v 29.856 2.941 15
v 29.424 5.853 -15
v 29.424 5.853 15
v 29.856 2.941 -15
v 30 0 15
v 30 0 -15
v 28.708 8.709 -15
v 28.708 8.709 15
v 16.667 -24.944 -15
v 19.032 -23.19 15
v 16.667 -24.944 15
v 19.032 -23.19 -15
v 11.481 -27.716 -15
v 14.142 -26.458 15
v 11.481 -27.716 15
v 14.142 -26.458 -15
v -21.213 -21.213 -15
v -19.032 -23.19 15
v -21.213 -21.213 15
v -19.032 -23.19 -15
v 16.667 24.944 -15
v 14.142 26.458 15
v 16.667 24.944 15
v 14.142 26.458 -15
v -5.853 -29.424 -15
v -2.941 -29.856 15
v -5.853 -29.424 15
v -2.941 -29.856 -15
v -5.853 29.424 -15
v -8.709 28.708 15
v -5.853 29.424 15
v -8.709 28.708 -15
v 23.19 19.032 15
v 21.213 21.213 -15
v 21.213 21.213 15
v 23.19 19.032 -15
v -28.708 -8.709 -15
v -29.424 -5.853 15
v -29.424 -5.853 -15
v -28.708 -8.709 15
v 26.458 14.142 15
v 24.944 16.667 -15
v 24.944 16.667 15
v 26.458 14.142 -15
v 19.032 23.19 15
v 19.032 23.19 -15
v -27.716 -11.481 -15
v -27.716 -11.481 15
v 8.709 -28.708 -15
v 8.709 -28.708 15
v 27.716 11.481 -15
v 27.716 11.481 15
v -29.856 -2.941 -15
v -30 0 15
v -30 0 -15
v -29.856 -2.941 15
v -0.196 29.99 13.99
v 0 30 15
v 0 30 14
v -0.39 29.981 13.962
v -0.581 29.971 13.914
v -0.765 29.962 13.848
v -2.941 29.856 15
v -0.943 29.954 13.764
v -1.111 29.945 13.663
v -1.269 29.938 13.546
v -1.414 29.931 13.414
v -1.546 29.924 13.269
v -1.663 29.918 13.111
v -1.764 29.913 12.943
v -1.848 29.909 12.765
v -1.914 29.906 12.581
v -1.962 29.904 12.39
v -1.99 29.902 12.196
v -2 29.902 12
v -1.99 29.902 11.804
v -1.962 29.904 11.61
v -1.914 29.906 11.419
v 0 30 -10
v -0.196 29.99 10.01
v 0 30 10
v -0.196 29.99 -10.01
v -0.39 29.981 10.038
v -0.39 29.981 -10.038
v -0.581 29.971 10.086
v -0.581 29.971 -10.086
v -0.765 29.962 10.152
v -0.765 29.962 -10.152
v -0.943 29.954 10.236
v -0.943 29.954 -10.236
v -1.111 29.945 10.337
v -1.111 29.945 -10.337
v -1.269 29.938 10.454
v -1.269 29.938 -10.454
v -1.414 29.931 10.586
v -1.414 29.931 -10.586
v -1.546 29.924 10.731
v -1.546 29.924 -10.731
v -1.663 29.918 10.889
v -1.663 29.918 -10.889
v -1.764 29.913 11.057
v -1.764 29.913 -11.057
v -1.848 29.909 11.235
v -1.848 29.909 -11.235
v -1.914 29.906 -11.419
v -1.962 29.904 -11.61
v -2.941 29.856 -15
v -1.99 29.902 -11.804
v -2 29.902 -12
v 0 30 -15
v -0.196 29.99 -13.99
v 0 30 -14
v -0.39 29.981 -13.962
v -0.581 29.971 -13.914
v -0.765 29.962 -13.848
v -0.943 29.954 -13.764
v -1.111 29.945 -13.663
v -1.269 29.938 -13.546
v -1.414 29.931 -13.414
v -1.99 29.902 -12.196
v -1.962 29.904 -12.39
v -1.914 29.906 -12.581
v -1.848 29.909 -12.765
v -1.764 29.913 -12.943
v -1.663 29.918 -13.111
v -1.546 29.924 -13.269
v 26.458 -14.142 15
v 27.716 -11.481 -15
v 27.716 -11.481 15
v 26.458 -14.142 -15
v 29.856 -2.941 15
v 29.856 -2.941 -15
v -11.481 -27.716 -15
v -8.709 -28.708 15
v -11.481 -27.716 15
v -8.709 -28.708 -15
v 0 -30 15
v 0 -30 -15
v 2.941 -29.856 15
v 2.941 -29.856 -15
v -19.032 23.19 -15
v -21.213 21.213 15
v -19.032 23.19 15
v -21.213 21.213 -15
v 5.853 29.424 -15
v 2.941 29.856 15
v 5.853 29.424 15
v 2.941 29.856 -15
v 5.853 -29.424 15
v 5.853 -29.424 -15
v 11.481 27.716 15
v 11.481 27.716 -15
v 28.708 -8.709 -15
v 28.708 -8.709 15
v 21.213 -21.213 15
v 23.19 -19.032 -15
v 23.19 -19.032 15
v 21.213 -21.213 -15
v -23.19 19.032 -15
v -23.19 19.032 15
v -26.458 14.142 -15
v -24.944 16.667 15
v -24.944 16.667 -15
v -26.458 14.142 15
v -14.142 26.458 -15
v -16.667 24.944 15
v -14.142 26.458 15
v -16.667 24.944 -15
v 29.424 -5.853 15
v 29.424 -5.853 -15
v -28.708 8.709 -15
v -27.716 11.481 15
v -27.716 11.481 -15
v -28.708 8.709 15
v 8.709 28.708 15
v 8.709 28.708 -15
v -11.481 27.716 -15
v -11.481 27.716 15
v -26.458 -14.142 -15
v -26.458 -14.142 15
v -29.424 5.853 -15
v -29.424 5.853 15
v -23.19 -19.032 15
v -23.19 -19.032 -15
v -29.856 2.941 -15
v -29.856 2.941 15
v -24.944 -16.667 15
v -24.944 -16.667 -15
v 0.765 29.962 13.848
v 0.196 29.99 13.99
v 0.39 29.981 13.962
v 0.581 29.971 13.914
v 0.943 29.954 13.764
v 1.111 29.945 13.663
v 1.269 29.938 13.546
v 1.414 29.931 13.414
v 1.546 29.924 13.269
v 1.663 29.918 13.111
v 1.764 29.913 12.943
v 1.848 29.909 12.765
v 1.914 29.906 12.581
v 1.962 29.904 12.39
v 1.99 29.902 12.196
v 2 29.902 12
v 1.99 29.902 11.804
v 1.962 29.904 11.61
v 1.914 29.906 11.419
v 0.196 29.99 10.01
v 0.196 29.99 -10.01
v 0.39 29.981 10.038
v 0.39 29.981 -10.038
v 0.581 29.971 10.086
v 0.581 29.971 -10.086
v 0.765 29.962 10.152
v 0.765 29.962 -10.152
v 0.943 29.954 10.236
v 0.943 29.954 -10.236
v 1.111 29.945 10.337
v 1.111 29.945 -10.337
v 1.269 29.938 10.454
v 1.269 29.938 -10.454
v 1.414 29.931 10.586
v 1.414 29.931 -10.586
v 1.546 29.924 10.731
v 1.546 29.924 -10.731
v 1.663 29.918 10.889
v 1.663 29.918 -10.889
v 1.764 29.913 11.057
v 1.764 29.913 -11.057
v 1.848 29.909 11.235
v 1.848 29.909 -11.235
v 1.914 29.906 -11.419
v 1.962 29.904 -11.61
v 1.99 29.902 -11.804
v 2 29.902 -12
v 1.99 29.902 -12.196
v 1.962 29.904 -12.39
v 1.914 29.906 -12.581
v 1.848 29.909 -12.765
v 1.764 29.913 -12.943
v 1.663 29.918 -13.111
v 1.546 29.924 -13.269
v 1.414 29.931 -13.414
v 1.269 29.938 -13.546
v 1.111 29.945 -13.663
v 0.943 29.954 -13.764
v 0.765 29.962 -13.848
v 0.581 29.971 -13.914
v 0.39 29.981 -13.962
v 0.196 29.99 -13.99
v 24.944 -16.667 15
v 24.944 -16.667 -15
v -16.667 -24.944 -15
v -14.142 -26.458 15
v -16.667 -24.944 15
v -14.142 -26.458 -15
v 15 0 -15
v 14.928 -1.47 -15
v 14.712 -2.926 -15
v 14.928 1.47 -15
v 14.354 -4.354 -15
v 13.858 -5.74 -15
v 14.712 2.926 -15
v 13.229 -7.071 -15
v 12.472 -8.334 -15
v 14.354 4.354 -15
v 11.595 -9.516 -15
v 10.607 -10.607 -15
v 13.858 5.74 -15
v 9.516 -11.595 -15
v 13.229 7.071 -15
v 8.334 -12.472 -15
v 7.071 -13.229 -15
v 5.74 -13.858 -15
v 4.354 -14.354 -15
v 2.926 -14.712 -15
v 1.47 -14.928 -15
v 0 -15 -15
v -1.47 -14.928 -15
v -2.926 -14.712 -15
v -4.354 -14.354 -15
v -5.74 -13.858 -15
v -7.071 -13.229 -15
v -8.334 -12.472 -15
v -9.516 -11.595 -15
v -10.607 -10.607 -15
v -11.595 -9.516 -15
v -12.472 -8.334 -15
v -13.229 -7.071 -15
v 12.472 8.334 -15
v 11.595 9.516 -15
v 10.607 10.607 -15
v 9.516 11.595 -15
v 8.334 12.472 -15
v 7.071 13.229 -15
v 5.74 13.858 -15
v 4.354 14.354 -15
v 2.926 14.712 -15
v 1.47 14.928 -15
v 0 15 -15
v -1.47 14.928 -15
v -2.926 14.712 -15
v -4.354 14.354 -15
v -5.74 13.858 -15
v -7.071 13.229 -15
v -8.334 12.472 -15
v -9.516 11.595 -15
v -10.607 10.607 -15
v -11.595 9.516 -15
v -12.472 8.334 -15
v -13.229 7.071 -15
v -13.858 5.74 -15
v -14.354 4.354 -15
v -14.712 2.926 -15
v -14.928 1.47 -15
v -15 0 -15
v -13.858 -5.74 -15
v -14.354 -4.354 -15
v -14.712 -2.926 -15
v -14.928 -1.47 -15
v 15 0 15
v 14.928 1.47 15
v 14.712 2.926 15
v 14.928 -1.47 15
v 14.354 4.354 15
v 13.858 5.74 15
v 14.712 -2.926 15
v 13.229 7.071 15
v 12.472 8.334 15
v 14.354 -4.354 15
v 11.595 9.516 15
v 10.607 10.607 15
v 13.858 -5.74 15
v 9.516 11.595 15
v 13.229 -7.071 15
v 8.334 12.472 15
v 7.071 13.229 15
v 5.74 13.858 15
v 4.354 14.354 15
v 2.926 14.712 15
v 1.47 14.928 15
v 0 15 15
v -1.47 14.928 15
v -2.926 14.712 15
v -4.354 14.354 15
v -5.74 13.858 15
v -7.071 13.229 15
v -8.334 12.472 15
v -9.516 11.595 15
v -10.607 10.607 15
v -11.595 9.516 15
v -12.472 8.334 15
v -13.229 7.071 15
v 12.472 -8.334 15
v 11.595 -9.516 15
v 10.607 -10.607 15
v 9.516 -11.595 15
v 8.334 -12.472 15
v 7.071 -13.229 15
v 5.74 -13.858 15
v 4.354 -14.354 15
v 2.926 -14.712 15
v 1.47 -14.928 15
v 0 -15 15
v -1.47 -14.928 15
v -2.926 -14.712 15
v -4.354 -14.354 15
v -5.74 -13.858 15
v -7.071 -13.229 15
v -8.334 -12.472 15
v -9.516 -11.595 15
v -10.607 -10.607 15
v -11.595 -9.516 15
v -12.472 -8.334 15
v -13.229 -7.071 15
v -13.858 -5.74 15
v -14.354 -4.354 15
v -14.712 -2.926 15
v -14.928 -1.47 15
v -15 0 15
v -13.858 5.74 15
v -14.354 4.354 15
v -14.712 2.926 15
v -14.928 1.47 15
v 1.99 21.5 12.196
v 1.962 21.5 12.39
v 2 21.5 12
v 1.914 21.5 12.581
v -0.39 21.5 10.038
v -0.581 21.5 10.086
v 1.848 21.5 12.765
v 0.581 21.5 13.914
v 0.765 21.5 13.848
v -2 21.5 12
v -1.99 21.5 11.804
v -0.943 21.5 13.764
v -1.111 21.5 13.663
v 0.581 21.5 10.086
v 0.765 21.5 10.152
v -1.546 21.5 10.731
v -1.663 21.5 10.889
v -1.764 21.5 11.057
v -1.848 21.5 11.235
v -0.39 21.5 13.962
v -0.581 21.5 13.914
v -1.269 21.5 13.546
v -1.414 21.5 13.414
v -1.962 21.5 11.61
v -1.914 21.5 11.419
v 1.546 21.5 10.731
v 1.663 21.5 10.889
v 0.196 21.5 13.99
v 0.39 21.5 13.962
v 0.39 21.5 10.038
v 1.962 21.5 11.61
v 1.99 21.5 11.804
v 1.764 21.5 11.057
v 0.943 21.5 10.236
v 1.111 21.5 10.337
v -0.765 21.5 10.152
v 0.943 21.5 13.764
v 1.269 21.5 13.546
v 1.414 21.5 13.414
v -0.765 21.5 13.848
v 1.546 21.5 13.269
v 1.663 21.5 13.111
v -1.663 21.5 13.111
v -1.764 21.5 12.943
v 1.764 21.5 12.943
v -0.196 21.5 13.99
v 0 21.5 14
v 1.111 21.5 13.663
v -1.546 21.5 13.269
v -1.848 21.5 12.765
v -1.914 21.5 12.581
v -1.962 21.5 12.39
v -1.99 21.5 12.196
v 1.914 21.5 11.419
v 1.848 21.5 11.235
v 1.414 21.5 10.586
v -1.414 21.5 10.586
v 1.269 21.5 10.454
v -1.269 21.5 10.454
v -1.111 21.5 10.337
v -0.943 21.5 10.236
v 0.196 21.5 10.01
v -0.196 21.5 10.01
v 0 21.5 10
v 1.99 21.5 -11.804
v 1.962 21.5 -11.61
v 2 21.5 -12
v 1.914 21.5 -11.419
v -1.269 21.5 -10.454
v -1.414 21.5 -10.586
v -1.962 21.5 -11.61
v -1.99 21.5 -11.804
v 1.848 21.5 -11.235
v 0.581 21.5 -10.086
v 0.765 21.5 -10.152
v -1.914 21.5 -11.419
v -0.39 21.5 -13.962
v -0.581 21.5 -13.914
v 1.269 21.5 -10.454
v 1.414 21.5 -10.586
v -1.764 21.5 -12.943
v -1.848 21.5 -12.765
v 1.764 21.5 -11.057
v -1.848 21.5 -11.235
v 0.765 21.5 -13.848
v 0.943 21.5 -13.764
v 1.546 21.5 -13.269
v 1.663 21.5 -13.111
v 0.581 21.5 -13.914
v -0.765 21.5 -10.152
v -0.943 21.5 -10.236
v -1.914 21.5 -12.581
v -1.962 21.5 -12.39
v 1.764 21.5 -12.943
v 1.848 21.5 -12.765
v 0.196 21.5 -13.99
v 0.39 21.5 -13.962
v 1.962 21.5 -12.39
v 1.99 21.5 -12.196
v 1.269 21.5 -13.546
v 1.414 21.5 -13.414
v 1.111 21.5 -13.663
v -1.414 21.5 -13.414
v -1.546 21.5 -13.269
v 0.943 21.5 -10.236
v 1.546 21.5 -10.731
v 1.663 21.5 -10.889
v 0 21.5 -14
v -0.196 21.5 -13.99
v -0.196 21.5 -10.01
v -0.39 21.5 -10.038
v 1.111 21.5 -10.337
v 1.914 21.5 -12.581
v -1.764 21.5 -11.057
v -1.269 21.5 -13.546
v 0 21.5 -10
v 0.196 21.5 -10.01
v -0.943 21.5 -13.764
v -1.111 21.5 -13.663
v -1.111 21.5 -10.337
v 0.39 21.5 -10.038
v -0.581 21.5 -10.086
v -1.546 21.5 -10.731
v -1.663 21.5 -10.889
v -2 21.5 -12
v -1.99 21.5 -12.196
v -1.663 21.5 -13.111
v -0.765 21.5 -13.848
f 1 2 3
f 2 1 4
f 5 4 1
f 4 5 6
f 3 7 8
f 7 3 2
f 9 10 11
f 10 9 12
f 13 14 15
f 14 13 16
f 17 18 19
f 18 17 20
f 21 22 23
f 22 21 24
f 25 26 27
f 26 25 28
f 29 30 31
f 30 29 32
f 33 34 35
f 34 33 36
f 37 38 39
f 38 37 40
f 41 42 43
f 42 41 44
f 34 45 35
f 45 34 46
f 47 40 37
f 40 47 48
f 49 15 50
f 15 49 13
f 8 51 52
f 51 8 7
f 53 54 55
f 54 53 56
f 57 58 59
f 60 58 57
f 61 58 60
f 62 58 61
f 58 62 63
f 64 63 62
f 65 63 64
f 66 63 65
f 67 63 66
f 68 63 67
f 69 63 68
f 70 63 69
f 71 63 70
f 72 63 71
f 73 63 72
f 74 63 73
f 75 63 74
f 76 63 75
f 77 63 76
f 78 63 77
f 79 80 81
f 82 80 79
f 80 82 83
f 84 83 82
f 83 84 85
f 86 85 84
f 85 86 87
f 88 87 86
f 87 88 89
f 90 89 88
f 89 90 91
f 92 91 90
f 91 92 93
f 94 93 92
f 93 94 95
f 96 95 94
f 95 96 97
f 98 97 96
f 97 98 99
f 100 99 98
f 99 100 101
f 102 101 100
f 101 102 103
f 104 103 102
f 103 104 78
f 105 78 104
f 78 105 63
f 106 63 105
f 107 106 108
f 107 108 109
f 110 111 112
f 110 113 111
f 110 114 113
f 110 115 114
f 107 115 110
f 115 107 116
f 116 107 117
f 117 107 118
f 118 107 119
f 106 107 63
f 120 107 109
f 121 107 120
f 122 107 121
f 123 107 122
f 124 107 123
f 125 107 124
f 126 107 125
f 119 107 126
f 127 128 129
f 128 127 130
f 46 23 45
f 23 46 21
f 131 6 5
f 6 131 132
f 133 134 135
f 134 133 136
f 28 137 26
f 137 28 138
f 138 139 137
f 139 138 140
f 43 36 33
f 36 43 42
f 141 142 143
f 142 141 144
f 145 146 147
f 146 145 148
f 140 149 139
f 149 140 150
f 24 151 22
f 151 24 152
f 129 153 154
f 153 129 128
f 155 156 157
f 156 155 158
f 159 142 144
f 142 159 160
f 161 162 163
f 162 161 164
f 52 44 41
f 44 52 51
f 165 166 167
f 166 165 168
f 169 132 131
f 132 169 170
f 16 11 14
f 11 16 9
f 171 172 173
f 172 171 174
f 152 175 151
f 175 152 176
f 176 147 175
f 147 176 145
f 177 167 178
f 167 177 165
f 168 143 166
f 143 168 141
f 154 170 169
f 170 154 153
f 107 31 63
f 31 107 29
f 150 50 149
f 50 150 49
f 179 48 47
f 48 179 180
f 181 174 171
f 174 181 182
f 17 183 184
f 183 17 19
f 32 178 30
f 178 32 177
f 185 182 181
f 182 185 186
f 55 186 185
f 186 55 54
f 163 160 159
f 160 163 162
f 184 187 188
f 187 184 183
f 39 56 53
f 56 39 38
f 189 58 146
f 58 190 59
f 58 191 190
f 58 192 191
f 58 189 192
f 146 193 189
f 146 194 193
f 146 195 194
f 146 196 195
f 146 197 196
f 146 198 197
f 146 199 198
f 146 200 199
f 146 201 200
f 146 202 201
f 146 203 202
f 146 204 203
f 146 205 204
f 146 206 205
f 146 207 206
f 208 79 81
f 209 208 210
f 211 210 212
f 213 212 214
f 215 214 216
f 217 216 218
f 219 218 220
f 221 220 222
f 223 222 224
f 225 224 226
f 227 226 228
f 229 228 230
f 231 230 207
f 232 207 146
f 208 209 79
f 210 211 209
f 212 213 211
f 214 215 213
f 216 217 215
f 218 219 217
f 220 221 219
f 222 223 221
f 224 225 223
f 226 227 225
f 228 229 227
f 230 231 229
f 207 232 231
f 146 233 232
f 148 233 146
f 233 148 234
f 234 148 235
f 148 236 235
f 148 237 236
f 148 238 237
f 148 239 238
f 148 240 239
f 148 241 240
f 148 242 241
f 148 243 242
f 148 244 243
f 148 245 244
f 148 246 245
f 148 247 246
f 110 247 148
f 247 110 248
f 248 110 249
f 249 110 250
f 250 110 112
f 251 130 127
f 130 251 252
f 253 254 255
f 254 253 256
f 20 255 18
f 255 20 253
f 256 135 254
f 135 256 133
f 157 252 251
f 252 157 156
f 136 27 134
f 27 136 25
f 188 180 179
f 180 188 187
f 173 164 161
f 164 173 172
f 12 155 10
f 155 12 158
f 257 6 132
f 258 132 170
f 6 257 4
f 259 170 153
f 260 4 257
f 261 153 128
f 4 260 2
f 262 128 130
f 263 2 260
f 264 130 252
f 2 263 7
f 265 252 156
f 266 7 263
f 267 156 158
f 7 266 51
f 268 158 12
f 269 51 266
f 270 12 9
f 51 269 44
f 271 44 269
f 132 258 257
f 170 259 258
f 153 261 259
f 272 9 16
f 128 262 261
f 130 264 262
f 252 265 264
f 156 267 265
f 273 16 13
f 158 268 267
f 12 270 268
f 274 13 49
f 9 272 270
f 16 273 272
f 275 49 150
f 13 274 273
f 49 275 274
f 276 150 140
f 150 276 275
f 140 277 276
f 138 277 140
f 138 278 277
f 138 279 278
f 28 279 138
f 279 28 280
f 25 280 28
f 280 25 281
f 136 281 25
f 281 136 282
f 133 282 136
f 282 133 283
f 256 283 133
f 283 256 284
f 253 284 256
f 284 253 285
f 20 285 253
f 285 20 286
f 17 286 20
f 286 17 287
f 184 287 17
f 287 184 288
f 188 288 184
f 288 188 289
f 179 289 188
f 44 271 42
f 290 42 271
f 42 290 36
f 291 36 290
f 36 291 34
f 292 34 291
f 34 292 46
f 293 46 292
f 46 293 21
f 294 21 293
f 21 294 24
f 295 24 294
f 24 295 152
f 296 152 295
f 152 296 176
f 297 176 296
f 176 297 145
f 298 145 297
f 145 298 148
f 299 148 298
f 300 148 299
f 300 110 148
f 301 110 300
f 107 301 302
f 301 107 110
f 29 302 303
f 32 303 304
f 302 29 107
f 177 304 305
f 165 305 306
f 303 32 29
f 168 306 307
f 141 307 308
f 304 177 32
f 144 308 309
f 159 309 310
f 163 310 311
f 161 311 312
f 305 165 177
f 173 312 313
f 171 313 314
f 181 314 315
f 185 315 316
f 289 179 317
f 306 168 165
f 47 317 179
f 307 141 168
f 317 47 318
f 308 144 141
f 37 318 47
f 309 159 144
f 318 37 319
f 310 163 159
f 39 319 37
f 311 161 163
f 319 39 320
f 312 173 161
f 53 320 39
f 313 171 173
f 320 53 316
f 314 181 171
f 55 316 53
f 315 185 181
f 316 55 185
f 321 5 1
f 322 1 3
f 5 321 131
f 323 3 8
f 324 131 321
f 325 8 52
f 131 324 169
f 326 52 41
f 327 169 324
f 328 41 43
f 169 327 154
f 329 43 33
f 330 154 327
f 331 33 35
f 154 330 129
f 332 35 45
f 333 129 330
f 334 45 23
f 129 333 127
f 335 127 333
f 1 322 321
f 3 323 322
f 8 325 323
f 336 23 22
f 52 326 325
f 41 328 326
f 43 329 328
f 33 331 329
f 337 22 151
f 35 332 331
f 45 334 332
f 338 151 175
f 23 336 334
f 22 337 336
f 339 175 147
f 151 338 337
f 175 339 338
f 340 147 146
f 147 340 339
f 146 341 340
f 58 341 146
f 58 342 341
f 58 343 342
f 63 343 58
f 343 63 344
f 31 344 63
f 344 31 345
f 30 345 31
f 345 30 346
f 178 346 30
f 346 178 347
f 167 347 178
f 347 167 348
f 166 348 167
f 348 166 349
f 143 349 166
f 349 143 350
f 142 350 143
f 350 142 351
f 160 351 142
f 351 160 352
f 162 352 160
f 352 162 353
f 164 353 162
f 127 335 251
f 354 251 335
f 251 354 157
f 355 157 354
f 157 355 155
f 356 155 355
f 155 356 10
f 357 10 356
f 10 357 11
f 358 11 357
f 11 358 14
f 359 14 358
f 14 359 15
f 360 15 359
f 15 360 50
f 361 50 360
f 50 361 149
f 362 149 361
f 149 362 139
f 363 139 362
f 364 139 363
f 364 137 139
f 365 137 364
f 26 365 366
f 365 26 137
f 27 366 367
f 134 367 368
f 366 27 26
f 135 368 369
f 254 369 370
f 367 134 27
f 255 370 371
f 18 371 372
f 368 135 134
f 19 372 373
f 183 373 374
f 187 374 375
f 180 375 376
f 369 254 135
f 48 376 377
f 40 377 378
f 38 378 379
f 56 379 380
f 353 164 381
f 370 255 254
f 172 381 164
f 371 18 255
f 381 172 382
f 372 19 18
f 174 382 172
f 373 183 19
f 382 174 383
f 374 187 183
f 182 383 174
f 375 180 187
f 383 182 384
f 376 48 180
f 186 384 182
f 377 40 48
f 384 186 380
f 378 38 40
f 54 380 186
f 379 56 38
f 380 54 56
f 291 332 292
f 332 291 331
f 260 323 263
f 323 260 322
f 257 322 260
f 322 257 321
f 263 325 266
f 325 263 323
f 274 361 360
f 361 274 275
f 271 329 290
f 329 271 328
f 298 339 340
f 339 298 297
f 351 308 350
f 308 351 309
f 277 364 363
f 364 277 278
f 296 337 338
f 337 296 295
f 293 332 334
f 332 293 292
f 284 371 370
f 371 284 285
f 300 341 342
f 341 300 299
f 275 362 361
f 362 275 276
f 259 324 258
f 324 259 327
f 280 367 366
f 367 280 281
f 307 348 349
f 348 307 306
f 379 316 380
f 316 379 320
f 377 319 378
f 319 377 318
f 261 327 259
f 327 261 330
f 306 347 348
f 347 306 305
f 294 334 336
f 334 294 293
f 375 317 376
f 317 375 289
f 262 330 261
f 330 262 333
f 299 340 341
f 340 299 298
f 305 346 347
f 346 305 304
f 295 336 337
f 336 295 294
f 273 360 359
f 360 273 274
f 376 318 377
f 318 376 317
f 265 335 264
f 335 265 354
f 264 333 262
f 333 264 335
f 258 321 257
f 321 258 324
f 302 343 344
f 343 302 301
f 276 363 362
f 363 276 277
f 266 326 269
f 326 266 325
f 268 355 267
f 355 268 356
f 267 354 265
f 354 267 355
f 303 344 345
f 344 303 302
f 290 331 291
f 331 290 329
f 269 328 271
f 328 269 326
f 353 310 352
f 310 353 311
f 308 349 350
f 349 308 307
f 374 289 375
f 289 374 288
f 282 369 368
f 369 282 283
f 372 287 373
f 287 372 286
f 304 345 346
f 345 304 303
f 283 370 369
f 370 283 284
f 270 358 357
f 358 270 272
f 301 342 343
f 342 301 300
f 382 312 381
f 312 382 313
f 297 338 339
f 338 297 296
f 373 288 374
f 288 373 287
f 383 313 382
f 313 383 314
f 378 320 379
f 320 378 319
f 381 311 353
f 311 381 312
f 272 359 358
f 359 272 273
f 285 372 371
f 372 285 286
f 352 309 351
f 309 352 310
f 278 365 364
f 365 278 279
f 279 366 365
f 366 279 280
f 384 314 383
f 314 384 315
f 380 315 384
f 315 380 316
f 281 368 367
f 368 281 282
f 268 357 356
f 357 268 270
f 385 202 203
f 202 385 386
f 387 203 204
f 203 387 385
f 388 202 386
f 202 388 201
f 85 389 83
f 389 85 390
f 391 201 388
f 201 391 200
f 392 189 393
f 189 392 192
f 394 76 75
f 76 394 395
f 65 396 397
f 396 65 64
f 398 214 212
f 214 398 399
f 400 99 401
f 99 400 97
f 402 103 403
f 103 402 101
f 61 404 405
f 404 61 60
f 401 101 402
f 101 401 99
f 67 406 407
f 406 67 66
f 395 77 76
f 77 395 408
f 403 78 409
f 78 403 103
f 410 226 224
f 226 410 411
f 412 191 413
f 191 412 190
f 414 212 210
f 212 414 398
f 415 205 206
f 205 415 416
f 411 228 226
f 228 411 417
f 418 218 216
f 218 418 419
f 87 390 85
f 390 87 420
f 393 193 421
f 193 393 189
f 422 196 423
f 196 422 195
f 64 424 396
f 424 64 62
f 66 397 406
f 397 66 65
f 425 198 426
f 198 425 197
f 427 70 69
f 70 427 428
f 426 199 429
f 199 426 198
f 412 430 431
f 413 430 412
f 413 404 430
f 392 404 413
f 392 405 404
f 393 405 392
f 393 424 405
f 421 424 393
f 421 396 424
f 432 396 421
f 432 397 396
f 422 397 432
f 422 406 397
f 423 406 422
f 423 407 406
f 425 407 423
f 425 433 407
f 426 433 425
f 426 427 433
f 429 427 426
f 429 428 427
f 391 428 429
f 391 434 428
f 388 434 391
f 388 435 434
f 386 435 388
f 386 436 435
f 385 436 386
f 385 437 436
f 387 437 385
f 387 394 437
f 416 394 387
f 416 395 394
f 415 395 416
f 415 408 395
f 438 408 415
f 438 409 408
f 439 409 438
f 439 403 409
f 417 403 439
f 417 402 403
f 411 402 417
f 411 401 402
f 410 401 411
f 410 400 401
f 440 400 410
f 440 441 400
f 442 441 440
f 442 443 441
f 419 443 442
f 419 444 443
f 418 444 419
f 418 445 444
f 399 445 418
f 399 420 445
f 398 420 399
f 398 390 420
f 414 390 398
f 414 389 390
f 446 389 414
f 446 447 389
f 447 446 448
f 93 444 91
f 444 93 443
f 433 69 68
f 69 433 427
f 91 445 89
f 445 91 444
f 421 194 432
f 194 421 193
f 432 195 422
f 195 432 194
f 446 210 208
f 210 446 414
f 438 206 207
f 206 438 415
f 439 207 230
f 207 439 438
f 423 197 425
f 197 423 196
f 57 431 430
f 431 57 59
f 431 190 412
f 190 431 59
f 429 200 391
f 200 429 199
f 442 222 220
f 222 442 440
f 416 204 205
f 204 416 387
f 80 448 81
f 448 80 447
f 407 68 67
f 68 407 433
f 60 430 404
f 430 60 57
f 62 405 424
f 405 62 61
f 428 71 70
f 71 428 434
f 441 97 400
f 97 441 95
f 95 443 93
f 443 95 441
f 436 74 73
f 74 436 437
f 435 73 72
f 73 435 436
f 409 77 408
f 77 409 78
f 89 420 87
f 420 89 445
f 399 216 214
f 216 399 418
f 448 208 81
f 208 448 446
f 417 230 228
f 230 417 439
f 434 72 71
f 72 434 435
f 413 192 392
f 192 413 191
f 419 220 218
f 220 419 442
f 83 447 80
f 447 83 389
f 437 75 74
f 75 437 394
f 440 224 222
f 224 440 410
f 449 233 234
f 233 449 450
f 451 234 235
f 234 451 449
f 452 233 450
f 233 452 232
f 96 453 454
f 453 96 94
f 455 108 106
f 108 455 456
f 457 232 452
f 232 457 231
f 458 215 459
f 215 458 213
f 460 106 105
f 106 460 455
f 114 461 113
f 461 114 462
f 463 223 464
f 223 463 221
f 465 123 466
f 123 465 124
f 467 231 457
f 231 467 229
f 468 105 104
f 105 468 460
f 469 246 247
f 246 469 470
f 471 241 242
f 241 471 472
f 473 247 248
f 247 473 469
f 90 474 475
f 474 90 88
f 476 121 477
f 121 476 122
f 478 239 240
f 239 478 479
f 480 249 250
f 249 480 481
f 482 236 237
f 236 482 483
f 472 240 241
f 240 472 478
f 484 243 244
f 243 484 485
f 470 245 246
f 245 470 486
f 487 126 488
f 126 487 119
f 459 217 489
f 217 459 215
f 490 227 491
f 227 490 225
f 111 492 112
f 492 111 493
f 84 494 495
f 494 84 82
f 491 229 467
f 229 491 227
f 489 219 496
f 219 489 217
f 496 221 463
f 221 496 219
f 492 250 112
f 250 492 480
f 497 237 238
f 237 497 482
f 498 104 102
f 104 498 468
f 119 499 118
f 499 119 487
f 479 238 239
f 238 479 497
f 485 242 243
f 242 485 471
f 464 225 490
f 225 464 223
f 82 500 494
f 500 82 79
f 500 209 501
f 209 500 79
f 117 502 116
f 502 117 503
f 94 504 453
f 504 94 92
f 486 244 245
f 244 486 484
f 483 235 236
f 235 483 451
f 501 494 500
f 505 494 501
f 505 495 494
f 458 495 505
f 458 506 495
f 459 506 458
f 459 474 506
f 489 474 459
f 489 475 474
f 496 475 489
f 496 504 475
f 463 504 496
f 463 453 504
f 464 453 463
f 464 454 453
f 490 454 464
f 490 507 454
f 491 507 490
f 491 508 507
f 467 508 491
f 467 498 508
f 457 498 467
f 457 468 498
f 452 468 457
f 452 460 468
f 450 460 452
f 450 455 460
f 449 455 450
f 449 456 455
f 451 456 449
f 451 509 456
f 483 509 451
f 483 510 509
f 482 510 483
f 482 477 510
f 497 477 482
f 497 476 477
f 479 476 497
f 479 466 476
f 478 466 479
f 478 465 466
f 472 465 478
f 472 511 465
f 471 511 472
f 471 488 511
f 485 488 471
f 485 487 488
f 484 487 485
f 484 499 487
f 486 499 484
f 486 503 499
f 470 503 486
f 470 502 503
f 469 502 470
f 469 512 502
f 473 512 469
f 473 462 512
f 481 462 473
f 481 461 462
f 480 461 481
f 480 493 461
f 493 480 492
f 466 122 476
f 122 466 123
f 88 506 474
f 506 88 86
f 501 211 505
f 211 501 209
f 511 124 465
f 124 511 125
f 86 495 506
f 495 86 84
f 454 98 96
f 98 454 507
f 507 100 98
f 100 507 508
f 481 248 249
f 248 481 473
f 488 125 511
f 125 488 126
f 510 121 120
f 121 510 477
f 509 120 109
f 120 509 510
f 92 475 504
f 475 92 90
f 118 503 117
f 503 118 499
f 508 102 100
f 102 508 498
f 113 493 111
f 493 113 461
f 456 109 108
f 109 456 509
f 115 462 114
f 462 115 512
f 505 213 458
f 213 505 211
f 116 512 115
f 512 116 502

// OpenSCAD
// COBRA Vertebra - C2 V1
// Height: 30.0mm, OD: 60.0mm

$fn = 64;

difference() {
    // Outer cylinder
    cylinder(h=30.0, d=60.0, center=true);
    
    // Inner channel
    cylinder(h=32.0, d=30.0, center=true);

    // Pivot holes
    translate([0, 30.0, 12.0])
    rotate([90, 0, 0])
    cylinder(h=17.0, d=4, center=true);
    
    translate([0, 30.0, -12.0])
    rotate([90, 0, 0])
    cylinder(h=17.0, d=4, center=true);
}
